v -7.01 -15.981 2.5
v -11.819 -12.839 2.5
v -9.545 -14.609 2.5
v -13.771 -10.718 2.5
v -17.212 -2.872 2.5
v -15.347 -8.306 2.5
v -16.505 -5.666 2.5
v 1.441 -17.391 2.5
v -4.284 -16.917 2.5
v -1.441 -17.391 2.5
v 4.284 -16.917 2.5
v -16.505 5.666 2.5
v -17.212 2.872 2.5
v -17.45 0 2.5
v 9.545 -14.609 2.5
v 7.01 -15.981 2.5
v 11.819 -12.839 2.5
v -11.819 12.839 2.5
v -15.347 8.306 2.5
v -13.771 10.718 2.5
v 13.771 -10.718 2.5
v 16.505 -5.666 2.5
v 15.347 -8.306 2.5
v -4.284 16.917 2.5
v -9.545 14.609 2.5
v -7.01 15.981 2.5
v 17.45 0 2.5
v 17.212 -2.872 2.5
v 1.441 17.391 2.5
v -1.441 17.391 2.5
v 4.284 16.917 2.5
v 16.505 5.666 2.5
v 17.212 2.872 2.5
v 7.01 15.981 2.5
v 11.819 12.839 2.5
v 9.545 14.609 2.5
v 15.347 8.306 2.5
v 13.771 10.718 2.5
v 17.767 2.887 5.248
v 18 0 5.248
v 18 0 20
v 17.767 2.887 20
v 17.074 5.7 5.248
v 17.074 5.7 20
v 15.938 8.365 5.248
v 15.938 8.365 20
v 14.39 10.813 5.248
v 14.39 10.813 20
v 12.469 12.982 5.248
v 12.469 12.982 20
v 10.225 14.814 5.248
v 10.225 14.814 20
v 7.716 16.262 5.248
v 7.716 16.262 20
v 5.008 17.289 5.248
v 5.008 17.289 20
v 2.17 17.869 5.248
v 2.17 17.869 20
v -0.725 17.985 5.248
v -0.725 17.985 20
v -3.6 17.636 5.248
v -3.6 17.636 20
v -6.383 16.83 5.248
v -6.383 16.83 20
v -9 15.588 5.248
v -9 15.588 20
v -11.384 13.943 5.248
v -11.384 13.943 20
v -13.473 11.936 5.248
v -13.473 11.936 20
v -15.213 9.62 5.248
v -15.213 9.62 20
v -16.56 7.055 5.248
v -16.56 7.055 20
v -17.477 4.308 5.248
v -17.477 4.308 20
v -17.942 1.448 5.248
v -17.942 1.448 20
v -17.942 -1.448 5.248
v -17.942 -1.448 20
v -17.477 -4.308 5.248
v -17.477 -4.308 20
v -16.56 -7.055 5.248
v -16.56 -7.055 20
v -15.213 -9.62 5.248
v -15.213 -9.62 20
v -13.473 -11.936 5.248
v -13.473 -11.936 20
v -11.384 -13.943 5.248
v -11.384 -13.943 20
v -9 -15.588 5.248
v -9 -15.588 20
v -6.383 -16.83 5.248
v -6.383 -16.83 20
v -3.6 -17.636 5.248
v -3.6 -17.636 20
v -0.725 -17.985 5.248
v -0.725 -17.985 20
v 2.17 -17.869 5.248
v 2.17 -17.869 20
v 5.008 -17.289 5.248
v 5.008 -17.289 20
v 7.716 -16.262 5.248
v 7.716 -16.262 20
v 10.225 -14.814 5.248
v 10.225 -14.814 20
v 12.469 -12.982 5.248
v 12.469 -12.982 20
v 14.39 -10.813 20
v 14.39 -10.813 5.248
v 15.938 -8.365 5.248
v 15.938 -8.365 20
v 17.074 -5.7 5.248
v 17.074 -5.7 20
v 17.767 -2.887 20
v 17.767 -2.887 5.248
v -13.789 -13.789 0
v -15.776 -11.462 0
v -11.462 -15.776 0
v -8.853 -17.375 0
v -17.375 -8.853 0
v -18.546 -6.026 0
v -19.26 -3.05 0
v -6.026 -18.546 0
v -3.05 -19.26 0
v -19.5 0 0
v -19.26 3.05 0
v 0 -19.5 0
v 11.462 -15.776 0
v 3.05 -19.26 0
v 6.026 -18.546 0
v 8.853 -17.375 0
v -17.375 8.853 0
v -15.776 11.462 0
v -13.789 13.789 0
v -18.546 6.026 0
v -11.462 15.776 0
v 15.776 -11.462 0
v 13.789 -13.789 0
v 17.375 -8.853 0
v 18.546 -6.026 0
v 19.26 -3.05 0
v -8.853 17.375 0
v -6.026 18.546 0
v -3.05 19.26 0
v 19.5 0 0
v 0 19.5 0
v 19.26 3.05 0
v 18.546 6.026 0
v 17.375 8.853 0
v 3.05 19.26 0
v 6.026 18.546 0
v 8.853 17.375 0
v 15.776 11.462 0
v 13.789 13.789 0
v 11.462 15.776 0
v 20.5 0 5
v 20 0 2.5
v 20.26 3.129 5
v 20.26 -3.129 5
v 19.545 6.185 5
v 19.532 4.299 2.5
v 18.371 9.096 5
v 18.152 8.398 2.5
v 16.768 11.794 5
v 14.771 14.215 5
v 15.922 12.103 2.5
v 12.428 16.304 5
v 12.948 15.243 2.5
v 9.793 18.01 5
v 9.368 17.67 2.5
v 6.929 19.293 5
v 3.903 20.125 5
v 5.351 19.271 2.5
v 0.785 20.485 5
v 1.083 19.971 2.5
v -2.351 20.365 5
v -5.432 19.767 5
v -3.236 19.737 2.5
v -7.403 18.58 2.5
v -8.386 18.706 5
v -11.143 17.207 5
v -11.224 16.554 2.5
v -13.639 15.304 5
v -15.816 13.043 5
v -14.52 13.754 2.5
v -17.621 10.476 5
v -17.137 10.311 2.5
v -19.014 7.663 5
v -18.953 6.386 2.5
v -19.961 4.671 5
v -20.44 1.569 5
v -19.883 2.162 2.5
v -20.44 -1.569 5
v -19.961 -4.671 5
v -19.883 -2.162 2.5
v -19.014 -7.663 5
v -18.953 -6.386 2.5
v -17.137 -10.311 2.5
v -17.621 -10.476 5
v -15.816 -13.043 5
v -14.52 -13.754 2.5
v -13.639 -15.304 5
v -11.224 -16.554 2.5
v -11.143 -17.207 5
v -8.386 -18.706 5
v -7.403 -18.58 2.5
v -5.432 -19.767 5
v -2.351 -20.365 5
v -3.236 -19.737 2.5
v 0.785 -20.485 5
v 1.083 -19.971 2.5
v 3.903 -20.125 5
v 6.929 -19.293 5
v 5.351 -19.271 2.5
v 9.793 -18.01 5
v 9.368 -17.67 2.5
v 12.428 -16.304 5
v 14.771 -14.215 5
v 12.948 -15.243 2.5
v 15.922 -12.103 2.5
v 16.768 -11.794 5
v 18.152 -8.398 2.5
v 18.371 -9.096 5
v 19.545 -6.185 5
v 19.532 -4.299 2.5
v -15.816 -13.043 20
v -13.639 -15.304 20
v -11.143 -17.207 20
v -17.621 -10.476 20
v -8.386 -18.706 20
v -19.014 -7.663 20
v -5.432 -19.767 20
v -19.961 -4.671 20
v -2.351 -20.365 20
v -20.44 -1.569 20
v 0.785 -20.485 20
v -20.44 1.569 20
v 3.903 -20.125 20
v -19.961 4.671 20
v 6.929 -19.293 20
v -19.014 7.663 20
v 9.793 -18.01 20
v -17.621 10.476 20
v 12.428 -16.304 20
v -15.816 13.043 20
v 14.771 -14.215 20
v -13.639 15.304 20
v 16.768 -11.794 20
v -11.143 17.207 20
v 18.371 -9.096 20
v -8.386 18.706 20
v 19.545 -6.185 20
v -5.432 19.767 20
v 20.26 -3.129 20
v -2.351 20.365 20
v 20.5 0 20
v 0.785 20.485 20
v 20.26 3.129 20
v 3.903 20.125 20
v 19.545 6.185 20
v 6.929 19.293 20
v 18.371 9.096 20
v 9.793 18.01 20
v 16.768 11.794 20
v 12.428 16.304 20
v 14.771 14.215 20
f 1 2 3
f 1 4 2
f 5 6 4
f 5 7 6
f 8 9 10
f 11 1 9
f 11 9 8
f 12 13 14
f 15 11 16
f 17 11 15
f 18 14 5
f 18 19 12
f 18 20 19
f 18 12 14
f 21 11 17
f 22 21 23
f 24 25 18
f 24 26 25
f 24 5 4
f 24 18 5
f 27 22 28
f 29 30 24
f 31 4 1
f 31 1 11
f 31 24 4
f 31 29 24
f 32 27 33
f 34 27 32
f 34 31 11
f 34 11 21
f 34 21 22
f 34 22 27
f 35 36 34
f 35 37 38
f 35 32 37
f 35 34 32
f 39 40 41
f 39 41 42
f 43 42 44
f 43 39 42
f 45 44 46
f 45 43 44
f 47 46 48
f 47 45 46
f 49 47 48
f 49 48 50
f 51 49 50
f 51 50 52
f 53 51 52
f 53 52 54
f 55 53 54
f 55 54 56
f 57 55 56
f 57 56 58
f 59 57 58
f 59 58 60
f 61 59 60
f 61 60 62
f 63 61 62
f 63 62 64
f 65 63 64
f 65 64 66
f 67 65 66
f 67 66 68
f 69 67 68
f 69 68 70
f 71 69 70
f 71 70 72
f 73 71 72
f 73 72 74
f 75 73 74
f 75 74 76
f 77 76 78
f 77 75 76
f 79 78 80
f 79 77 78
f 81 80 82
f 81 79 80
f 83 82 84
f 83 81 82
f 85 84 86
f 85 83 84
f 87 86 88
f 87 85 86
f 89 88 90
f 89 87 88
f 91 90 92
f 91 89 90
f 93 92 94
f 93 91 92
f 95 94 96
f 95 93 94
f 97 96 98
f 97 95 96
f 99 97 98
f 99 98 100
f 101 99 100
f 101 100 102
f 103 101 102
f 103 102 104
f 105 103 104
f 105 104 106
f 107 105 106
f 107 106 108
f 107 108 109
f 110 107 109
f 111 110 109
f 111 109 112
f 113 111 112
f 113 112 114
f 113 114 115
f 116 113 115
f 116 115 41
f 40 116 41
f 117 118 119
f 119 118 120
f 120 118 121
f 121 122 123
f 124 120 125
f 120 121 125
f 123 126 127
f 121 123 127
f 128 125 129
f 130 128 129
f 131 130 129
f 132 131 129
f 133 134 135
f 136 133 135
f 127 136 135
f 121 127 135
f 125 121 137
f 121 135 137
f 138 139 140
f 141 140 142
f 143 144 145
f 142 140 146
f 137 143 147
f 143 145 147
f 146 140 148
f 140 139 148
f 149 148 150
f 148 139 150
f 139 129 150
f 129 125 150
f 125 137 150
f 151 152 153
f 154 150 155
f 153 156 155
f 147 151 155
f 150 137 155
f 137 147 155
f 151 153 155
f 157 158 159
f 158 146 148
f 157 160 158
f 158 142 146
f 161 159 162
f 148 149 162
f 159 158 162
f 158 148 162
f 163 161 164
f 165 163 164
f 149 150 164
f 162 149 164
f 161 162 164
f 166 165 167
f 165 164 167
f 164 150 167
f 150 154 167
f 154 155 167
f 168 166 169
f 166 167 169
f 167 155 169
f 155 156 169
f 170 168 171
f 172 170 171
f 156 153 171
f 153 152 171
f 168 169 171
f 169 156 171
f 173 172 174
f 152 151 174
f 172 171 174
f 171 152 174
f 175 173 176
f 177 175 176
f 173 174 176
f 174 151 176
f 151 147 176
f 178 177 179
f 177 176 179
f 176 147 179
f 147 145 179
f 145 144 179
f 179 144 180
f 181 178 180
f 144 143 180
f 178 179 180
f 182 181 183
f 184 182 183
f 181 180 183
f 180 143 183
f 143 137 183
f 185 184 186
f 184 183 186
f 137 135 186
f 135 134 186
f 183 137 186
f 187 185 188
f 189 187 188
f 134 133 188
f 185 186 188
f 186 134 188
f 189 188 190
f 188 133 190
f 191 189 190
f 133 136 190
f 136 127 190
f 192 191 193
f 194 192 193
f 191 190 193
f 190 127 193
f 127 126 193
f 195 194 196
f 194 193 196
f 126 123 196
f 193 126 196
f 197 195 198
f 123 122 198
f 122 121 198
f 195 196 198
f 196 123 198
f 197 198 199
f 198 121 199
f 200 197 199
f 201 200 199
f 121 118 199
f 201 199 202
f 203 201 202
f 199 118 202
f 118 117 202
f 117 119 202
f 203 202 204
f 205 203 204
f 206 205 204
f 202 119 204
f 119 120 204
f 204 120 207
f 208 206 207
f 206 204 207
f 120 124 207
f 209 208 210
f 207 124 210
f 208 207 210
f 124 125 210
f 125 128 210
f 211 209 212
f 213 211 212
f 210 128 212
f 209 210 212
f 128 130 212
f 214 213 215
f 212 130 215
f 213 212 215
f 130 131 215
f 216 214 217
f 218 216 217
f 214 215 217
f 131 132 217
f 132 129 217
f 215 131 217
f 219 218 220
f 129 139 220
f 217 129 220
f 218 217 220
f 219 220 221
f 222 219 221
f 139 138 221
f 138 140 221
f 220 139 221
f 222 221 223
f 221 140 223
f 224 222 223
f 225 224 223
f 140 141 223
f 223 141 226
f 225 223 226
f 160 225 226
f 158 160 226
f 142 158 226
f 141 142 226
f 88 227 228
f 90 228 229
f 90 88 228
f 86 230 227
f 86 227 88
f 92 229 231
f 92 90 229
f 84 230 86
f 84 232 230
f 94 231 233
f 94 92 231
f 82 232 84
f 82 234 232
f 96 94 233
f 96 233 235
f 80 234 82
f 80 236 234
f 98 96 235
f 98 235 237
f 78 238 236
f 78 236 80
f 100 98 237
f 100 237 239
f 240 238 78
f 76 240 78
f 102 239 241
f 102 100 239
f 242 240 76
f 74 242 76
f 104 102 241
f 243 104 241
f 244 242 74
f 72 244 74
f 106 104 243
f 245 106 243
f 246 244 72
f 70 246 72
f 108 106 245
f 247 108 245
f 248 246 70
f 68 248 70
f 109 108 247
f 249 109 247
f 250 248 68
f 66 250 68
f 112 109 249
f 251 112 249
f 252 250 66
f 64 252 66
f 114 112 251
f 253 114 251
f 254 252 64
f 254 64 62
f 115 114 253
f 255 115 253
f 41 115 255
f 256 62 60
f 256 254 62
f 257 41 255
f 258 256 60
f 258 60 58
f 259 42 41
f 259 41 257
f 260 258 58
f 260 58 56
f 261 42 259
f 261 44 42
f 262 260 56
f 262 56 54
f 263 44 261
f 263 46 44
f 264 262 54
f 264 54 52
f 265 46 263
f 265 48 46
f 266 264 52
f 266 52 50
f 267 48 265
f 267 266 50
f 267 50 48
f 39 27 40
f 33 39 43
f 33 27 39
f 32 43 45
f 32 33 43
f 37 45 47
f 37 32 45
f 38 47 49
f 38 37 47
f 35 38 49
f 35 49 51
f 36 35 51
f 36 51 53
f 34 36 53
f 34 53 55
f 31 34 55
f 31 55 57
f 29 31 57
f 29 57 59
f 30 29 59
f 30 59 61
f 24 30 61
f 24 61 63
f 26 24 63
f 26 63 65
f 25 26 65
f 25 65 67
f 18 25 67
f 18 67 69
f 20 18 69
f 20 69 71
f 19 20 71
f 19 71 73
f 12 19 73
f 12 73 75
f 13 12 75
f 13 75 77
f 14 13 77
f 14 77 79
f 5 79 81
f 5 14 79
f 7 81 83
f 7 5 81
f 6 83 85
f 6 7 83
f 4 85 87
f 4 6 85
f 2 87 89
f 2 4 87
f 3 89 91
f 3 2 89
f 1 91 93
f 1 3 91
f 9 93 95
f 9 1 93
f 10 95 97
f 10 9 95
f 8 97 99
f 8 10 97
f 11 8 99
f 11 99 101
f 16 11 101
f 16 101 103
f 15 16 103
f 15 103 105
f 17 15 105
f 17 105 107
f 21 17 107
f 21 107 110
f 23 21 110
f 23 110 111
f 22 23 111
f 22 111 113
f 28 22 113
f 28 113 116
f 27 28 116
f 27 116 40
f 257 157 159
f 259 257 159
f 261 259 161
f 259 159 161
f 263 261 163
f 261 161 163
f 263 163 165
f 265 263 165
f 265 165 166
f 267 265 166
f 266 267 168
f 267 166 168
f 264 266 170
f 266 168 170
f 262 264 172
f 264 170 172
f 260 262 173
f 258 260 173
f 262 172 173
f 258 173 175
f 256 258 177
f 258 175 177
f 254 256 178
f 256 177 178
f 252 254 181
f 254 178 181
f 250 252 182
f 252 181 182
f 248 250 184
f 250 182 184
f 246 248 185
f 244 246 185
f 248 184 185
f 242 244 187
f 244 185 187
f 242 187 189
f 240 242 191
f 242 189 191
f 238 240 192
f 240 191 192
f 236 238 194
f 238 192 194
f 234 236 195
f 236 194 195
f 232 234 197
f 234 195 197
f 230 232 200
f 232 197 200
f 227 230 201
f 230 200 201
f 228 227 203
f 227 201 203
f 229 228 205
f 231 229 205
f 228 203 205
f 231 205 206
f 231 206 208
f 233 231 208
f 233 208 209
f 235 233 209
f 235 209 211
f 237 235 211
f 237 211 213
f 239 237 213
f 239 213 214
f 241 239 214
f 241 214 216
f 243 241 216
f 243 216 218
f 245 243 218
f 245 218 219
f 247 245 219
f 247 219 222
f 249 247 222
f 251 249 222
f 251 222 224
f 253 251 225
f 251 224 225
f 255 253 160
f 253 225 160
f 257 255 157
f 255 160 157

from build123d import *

# Parameters (mm, degrees)
F0_R     = 20.5
F1_DEPTH = 20
F2_SIZE2 = 1
F2_SIZE  = 5
F3_T     = -2.5


with BuildPart() as f1:
    # F0 (on Top) → F1 (new body)
    with BuildSketch(Plane.XY):
        Circle(F0_R)
    extrude(amount=F1_DEPTH)

    # F2
    f2_edges = [f1.edges().sort_by_distance(p)[0] for p in [
        (-20.5, 0, 0),
    ]]
    chamfer(f2_edges, length=F2_SIZE, length2=F2_SIZE2)

    # F3
    f3_openings = [f1.faces().sort_by_distance(p)[0] for p in [
        (0, 0, 20),
    ]]
    offset(amount=F3_T, openings=f3_openings)


solid = f1.part
